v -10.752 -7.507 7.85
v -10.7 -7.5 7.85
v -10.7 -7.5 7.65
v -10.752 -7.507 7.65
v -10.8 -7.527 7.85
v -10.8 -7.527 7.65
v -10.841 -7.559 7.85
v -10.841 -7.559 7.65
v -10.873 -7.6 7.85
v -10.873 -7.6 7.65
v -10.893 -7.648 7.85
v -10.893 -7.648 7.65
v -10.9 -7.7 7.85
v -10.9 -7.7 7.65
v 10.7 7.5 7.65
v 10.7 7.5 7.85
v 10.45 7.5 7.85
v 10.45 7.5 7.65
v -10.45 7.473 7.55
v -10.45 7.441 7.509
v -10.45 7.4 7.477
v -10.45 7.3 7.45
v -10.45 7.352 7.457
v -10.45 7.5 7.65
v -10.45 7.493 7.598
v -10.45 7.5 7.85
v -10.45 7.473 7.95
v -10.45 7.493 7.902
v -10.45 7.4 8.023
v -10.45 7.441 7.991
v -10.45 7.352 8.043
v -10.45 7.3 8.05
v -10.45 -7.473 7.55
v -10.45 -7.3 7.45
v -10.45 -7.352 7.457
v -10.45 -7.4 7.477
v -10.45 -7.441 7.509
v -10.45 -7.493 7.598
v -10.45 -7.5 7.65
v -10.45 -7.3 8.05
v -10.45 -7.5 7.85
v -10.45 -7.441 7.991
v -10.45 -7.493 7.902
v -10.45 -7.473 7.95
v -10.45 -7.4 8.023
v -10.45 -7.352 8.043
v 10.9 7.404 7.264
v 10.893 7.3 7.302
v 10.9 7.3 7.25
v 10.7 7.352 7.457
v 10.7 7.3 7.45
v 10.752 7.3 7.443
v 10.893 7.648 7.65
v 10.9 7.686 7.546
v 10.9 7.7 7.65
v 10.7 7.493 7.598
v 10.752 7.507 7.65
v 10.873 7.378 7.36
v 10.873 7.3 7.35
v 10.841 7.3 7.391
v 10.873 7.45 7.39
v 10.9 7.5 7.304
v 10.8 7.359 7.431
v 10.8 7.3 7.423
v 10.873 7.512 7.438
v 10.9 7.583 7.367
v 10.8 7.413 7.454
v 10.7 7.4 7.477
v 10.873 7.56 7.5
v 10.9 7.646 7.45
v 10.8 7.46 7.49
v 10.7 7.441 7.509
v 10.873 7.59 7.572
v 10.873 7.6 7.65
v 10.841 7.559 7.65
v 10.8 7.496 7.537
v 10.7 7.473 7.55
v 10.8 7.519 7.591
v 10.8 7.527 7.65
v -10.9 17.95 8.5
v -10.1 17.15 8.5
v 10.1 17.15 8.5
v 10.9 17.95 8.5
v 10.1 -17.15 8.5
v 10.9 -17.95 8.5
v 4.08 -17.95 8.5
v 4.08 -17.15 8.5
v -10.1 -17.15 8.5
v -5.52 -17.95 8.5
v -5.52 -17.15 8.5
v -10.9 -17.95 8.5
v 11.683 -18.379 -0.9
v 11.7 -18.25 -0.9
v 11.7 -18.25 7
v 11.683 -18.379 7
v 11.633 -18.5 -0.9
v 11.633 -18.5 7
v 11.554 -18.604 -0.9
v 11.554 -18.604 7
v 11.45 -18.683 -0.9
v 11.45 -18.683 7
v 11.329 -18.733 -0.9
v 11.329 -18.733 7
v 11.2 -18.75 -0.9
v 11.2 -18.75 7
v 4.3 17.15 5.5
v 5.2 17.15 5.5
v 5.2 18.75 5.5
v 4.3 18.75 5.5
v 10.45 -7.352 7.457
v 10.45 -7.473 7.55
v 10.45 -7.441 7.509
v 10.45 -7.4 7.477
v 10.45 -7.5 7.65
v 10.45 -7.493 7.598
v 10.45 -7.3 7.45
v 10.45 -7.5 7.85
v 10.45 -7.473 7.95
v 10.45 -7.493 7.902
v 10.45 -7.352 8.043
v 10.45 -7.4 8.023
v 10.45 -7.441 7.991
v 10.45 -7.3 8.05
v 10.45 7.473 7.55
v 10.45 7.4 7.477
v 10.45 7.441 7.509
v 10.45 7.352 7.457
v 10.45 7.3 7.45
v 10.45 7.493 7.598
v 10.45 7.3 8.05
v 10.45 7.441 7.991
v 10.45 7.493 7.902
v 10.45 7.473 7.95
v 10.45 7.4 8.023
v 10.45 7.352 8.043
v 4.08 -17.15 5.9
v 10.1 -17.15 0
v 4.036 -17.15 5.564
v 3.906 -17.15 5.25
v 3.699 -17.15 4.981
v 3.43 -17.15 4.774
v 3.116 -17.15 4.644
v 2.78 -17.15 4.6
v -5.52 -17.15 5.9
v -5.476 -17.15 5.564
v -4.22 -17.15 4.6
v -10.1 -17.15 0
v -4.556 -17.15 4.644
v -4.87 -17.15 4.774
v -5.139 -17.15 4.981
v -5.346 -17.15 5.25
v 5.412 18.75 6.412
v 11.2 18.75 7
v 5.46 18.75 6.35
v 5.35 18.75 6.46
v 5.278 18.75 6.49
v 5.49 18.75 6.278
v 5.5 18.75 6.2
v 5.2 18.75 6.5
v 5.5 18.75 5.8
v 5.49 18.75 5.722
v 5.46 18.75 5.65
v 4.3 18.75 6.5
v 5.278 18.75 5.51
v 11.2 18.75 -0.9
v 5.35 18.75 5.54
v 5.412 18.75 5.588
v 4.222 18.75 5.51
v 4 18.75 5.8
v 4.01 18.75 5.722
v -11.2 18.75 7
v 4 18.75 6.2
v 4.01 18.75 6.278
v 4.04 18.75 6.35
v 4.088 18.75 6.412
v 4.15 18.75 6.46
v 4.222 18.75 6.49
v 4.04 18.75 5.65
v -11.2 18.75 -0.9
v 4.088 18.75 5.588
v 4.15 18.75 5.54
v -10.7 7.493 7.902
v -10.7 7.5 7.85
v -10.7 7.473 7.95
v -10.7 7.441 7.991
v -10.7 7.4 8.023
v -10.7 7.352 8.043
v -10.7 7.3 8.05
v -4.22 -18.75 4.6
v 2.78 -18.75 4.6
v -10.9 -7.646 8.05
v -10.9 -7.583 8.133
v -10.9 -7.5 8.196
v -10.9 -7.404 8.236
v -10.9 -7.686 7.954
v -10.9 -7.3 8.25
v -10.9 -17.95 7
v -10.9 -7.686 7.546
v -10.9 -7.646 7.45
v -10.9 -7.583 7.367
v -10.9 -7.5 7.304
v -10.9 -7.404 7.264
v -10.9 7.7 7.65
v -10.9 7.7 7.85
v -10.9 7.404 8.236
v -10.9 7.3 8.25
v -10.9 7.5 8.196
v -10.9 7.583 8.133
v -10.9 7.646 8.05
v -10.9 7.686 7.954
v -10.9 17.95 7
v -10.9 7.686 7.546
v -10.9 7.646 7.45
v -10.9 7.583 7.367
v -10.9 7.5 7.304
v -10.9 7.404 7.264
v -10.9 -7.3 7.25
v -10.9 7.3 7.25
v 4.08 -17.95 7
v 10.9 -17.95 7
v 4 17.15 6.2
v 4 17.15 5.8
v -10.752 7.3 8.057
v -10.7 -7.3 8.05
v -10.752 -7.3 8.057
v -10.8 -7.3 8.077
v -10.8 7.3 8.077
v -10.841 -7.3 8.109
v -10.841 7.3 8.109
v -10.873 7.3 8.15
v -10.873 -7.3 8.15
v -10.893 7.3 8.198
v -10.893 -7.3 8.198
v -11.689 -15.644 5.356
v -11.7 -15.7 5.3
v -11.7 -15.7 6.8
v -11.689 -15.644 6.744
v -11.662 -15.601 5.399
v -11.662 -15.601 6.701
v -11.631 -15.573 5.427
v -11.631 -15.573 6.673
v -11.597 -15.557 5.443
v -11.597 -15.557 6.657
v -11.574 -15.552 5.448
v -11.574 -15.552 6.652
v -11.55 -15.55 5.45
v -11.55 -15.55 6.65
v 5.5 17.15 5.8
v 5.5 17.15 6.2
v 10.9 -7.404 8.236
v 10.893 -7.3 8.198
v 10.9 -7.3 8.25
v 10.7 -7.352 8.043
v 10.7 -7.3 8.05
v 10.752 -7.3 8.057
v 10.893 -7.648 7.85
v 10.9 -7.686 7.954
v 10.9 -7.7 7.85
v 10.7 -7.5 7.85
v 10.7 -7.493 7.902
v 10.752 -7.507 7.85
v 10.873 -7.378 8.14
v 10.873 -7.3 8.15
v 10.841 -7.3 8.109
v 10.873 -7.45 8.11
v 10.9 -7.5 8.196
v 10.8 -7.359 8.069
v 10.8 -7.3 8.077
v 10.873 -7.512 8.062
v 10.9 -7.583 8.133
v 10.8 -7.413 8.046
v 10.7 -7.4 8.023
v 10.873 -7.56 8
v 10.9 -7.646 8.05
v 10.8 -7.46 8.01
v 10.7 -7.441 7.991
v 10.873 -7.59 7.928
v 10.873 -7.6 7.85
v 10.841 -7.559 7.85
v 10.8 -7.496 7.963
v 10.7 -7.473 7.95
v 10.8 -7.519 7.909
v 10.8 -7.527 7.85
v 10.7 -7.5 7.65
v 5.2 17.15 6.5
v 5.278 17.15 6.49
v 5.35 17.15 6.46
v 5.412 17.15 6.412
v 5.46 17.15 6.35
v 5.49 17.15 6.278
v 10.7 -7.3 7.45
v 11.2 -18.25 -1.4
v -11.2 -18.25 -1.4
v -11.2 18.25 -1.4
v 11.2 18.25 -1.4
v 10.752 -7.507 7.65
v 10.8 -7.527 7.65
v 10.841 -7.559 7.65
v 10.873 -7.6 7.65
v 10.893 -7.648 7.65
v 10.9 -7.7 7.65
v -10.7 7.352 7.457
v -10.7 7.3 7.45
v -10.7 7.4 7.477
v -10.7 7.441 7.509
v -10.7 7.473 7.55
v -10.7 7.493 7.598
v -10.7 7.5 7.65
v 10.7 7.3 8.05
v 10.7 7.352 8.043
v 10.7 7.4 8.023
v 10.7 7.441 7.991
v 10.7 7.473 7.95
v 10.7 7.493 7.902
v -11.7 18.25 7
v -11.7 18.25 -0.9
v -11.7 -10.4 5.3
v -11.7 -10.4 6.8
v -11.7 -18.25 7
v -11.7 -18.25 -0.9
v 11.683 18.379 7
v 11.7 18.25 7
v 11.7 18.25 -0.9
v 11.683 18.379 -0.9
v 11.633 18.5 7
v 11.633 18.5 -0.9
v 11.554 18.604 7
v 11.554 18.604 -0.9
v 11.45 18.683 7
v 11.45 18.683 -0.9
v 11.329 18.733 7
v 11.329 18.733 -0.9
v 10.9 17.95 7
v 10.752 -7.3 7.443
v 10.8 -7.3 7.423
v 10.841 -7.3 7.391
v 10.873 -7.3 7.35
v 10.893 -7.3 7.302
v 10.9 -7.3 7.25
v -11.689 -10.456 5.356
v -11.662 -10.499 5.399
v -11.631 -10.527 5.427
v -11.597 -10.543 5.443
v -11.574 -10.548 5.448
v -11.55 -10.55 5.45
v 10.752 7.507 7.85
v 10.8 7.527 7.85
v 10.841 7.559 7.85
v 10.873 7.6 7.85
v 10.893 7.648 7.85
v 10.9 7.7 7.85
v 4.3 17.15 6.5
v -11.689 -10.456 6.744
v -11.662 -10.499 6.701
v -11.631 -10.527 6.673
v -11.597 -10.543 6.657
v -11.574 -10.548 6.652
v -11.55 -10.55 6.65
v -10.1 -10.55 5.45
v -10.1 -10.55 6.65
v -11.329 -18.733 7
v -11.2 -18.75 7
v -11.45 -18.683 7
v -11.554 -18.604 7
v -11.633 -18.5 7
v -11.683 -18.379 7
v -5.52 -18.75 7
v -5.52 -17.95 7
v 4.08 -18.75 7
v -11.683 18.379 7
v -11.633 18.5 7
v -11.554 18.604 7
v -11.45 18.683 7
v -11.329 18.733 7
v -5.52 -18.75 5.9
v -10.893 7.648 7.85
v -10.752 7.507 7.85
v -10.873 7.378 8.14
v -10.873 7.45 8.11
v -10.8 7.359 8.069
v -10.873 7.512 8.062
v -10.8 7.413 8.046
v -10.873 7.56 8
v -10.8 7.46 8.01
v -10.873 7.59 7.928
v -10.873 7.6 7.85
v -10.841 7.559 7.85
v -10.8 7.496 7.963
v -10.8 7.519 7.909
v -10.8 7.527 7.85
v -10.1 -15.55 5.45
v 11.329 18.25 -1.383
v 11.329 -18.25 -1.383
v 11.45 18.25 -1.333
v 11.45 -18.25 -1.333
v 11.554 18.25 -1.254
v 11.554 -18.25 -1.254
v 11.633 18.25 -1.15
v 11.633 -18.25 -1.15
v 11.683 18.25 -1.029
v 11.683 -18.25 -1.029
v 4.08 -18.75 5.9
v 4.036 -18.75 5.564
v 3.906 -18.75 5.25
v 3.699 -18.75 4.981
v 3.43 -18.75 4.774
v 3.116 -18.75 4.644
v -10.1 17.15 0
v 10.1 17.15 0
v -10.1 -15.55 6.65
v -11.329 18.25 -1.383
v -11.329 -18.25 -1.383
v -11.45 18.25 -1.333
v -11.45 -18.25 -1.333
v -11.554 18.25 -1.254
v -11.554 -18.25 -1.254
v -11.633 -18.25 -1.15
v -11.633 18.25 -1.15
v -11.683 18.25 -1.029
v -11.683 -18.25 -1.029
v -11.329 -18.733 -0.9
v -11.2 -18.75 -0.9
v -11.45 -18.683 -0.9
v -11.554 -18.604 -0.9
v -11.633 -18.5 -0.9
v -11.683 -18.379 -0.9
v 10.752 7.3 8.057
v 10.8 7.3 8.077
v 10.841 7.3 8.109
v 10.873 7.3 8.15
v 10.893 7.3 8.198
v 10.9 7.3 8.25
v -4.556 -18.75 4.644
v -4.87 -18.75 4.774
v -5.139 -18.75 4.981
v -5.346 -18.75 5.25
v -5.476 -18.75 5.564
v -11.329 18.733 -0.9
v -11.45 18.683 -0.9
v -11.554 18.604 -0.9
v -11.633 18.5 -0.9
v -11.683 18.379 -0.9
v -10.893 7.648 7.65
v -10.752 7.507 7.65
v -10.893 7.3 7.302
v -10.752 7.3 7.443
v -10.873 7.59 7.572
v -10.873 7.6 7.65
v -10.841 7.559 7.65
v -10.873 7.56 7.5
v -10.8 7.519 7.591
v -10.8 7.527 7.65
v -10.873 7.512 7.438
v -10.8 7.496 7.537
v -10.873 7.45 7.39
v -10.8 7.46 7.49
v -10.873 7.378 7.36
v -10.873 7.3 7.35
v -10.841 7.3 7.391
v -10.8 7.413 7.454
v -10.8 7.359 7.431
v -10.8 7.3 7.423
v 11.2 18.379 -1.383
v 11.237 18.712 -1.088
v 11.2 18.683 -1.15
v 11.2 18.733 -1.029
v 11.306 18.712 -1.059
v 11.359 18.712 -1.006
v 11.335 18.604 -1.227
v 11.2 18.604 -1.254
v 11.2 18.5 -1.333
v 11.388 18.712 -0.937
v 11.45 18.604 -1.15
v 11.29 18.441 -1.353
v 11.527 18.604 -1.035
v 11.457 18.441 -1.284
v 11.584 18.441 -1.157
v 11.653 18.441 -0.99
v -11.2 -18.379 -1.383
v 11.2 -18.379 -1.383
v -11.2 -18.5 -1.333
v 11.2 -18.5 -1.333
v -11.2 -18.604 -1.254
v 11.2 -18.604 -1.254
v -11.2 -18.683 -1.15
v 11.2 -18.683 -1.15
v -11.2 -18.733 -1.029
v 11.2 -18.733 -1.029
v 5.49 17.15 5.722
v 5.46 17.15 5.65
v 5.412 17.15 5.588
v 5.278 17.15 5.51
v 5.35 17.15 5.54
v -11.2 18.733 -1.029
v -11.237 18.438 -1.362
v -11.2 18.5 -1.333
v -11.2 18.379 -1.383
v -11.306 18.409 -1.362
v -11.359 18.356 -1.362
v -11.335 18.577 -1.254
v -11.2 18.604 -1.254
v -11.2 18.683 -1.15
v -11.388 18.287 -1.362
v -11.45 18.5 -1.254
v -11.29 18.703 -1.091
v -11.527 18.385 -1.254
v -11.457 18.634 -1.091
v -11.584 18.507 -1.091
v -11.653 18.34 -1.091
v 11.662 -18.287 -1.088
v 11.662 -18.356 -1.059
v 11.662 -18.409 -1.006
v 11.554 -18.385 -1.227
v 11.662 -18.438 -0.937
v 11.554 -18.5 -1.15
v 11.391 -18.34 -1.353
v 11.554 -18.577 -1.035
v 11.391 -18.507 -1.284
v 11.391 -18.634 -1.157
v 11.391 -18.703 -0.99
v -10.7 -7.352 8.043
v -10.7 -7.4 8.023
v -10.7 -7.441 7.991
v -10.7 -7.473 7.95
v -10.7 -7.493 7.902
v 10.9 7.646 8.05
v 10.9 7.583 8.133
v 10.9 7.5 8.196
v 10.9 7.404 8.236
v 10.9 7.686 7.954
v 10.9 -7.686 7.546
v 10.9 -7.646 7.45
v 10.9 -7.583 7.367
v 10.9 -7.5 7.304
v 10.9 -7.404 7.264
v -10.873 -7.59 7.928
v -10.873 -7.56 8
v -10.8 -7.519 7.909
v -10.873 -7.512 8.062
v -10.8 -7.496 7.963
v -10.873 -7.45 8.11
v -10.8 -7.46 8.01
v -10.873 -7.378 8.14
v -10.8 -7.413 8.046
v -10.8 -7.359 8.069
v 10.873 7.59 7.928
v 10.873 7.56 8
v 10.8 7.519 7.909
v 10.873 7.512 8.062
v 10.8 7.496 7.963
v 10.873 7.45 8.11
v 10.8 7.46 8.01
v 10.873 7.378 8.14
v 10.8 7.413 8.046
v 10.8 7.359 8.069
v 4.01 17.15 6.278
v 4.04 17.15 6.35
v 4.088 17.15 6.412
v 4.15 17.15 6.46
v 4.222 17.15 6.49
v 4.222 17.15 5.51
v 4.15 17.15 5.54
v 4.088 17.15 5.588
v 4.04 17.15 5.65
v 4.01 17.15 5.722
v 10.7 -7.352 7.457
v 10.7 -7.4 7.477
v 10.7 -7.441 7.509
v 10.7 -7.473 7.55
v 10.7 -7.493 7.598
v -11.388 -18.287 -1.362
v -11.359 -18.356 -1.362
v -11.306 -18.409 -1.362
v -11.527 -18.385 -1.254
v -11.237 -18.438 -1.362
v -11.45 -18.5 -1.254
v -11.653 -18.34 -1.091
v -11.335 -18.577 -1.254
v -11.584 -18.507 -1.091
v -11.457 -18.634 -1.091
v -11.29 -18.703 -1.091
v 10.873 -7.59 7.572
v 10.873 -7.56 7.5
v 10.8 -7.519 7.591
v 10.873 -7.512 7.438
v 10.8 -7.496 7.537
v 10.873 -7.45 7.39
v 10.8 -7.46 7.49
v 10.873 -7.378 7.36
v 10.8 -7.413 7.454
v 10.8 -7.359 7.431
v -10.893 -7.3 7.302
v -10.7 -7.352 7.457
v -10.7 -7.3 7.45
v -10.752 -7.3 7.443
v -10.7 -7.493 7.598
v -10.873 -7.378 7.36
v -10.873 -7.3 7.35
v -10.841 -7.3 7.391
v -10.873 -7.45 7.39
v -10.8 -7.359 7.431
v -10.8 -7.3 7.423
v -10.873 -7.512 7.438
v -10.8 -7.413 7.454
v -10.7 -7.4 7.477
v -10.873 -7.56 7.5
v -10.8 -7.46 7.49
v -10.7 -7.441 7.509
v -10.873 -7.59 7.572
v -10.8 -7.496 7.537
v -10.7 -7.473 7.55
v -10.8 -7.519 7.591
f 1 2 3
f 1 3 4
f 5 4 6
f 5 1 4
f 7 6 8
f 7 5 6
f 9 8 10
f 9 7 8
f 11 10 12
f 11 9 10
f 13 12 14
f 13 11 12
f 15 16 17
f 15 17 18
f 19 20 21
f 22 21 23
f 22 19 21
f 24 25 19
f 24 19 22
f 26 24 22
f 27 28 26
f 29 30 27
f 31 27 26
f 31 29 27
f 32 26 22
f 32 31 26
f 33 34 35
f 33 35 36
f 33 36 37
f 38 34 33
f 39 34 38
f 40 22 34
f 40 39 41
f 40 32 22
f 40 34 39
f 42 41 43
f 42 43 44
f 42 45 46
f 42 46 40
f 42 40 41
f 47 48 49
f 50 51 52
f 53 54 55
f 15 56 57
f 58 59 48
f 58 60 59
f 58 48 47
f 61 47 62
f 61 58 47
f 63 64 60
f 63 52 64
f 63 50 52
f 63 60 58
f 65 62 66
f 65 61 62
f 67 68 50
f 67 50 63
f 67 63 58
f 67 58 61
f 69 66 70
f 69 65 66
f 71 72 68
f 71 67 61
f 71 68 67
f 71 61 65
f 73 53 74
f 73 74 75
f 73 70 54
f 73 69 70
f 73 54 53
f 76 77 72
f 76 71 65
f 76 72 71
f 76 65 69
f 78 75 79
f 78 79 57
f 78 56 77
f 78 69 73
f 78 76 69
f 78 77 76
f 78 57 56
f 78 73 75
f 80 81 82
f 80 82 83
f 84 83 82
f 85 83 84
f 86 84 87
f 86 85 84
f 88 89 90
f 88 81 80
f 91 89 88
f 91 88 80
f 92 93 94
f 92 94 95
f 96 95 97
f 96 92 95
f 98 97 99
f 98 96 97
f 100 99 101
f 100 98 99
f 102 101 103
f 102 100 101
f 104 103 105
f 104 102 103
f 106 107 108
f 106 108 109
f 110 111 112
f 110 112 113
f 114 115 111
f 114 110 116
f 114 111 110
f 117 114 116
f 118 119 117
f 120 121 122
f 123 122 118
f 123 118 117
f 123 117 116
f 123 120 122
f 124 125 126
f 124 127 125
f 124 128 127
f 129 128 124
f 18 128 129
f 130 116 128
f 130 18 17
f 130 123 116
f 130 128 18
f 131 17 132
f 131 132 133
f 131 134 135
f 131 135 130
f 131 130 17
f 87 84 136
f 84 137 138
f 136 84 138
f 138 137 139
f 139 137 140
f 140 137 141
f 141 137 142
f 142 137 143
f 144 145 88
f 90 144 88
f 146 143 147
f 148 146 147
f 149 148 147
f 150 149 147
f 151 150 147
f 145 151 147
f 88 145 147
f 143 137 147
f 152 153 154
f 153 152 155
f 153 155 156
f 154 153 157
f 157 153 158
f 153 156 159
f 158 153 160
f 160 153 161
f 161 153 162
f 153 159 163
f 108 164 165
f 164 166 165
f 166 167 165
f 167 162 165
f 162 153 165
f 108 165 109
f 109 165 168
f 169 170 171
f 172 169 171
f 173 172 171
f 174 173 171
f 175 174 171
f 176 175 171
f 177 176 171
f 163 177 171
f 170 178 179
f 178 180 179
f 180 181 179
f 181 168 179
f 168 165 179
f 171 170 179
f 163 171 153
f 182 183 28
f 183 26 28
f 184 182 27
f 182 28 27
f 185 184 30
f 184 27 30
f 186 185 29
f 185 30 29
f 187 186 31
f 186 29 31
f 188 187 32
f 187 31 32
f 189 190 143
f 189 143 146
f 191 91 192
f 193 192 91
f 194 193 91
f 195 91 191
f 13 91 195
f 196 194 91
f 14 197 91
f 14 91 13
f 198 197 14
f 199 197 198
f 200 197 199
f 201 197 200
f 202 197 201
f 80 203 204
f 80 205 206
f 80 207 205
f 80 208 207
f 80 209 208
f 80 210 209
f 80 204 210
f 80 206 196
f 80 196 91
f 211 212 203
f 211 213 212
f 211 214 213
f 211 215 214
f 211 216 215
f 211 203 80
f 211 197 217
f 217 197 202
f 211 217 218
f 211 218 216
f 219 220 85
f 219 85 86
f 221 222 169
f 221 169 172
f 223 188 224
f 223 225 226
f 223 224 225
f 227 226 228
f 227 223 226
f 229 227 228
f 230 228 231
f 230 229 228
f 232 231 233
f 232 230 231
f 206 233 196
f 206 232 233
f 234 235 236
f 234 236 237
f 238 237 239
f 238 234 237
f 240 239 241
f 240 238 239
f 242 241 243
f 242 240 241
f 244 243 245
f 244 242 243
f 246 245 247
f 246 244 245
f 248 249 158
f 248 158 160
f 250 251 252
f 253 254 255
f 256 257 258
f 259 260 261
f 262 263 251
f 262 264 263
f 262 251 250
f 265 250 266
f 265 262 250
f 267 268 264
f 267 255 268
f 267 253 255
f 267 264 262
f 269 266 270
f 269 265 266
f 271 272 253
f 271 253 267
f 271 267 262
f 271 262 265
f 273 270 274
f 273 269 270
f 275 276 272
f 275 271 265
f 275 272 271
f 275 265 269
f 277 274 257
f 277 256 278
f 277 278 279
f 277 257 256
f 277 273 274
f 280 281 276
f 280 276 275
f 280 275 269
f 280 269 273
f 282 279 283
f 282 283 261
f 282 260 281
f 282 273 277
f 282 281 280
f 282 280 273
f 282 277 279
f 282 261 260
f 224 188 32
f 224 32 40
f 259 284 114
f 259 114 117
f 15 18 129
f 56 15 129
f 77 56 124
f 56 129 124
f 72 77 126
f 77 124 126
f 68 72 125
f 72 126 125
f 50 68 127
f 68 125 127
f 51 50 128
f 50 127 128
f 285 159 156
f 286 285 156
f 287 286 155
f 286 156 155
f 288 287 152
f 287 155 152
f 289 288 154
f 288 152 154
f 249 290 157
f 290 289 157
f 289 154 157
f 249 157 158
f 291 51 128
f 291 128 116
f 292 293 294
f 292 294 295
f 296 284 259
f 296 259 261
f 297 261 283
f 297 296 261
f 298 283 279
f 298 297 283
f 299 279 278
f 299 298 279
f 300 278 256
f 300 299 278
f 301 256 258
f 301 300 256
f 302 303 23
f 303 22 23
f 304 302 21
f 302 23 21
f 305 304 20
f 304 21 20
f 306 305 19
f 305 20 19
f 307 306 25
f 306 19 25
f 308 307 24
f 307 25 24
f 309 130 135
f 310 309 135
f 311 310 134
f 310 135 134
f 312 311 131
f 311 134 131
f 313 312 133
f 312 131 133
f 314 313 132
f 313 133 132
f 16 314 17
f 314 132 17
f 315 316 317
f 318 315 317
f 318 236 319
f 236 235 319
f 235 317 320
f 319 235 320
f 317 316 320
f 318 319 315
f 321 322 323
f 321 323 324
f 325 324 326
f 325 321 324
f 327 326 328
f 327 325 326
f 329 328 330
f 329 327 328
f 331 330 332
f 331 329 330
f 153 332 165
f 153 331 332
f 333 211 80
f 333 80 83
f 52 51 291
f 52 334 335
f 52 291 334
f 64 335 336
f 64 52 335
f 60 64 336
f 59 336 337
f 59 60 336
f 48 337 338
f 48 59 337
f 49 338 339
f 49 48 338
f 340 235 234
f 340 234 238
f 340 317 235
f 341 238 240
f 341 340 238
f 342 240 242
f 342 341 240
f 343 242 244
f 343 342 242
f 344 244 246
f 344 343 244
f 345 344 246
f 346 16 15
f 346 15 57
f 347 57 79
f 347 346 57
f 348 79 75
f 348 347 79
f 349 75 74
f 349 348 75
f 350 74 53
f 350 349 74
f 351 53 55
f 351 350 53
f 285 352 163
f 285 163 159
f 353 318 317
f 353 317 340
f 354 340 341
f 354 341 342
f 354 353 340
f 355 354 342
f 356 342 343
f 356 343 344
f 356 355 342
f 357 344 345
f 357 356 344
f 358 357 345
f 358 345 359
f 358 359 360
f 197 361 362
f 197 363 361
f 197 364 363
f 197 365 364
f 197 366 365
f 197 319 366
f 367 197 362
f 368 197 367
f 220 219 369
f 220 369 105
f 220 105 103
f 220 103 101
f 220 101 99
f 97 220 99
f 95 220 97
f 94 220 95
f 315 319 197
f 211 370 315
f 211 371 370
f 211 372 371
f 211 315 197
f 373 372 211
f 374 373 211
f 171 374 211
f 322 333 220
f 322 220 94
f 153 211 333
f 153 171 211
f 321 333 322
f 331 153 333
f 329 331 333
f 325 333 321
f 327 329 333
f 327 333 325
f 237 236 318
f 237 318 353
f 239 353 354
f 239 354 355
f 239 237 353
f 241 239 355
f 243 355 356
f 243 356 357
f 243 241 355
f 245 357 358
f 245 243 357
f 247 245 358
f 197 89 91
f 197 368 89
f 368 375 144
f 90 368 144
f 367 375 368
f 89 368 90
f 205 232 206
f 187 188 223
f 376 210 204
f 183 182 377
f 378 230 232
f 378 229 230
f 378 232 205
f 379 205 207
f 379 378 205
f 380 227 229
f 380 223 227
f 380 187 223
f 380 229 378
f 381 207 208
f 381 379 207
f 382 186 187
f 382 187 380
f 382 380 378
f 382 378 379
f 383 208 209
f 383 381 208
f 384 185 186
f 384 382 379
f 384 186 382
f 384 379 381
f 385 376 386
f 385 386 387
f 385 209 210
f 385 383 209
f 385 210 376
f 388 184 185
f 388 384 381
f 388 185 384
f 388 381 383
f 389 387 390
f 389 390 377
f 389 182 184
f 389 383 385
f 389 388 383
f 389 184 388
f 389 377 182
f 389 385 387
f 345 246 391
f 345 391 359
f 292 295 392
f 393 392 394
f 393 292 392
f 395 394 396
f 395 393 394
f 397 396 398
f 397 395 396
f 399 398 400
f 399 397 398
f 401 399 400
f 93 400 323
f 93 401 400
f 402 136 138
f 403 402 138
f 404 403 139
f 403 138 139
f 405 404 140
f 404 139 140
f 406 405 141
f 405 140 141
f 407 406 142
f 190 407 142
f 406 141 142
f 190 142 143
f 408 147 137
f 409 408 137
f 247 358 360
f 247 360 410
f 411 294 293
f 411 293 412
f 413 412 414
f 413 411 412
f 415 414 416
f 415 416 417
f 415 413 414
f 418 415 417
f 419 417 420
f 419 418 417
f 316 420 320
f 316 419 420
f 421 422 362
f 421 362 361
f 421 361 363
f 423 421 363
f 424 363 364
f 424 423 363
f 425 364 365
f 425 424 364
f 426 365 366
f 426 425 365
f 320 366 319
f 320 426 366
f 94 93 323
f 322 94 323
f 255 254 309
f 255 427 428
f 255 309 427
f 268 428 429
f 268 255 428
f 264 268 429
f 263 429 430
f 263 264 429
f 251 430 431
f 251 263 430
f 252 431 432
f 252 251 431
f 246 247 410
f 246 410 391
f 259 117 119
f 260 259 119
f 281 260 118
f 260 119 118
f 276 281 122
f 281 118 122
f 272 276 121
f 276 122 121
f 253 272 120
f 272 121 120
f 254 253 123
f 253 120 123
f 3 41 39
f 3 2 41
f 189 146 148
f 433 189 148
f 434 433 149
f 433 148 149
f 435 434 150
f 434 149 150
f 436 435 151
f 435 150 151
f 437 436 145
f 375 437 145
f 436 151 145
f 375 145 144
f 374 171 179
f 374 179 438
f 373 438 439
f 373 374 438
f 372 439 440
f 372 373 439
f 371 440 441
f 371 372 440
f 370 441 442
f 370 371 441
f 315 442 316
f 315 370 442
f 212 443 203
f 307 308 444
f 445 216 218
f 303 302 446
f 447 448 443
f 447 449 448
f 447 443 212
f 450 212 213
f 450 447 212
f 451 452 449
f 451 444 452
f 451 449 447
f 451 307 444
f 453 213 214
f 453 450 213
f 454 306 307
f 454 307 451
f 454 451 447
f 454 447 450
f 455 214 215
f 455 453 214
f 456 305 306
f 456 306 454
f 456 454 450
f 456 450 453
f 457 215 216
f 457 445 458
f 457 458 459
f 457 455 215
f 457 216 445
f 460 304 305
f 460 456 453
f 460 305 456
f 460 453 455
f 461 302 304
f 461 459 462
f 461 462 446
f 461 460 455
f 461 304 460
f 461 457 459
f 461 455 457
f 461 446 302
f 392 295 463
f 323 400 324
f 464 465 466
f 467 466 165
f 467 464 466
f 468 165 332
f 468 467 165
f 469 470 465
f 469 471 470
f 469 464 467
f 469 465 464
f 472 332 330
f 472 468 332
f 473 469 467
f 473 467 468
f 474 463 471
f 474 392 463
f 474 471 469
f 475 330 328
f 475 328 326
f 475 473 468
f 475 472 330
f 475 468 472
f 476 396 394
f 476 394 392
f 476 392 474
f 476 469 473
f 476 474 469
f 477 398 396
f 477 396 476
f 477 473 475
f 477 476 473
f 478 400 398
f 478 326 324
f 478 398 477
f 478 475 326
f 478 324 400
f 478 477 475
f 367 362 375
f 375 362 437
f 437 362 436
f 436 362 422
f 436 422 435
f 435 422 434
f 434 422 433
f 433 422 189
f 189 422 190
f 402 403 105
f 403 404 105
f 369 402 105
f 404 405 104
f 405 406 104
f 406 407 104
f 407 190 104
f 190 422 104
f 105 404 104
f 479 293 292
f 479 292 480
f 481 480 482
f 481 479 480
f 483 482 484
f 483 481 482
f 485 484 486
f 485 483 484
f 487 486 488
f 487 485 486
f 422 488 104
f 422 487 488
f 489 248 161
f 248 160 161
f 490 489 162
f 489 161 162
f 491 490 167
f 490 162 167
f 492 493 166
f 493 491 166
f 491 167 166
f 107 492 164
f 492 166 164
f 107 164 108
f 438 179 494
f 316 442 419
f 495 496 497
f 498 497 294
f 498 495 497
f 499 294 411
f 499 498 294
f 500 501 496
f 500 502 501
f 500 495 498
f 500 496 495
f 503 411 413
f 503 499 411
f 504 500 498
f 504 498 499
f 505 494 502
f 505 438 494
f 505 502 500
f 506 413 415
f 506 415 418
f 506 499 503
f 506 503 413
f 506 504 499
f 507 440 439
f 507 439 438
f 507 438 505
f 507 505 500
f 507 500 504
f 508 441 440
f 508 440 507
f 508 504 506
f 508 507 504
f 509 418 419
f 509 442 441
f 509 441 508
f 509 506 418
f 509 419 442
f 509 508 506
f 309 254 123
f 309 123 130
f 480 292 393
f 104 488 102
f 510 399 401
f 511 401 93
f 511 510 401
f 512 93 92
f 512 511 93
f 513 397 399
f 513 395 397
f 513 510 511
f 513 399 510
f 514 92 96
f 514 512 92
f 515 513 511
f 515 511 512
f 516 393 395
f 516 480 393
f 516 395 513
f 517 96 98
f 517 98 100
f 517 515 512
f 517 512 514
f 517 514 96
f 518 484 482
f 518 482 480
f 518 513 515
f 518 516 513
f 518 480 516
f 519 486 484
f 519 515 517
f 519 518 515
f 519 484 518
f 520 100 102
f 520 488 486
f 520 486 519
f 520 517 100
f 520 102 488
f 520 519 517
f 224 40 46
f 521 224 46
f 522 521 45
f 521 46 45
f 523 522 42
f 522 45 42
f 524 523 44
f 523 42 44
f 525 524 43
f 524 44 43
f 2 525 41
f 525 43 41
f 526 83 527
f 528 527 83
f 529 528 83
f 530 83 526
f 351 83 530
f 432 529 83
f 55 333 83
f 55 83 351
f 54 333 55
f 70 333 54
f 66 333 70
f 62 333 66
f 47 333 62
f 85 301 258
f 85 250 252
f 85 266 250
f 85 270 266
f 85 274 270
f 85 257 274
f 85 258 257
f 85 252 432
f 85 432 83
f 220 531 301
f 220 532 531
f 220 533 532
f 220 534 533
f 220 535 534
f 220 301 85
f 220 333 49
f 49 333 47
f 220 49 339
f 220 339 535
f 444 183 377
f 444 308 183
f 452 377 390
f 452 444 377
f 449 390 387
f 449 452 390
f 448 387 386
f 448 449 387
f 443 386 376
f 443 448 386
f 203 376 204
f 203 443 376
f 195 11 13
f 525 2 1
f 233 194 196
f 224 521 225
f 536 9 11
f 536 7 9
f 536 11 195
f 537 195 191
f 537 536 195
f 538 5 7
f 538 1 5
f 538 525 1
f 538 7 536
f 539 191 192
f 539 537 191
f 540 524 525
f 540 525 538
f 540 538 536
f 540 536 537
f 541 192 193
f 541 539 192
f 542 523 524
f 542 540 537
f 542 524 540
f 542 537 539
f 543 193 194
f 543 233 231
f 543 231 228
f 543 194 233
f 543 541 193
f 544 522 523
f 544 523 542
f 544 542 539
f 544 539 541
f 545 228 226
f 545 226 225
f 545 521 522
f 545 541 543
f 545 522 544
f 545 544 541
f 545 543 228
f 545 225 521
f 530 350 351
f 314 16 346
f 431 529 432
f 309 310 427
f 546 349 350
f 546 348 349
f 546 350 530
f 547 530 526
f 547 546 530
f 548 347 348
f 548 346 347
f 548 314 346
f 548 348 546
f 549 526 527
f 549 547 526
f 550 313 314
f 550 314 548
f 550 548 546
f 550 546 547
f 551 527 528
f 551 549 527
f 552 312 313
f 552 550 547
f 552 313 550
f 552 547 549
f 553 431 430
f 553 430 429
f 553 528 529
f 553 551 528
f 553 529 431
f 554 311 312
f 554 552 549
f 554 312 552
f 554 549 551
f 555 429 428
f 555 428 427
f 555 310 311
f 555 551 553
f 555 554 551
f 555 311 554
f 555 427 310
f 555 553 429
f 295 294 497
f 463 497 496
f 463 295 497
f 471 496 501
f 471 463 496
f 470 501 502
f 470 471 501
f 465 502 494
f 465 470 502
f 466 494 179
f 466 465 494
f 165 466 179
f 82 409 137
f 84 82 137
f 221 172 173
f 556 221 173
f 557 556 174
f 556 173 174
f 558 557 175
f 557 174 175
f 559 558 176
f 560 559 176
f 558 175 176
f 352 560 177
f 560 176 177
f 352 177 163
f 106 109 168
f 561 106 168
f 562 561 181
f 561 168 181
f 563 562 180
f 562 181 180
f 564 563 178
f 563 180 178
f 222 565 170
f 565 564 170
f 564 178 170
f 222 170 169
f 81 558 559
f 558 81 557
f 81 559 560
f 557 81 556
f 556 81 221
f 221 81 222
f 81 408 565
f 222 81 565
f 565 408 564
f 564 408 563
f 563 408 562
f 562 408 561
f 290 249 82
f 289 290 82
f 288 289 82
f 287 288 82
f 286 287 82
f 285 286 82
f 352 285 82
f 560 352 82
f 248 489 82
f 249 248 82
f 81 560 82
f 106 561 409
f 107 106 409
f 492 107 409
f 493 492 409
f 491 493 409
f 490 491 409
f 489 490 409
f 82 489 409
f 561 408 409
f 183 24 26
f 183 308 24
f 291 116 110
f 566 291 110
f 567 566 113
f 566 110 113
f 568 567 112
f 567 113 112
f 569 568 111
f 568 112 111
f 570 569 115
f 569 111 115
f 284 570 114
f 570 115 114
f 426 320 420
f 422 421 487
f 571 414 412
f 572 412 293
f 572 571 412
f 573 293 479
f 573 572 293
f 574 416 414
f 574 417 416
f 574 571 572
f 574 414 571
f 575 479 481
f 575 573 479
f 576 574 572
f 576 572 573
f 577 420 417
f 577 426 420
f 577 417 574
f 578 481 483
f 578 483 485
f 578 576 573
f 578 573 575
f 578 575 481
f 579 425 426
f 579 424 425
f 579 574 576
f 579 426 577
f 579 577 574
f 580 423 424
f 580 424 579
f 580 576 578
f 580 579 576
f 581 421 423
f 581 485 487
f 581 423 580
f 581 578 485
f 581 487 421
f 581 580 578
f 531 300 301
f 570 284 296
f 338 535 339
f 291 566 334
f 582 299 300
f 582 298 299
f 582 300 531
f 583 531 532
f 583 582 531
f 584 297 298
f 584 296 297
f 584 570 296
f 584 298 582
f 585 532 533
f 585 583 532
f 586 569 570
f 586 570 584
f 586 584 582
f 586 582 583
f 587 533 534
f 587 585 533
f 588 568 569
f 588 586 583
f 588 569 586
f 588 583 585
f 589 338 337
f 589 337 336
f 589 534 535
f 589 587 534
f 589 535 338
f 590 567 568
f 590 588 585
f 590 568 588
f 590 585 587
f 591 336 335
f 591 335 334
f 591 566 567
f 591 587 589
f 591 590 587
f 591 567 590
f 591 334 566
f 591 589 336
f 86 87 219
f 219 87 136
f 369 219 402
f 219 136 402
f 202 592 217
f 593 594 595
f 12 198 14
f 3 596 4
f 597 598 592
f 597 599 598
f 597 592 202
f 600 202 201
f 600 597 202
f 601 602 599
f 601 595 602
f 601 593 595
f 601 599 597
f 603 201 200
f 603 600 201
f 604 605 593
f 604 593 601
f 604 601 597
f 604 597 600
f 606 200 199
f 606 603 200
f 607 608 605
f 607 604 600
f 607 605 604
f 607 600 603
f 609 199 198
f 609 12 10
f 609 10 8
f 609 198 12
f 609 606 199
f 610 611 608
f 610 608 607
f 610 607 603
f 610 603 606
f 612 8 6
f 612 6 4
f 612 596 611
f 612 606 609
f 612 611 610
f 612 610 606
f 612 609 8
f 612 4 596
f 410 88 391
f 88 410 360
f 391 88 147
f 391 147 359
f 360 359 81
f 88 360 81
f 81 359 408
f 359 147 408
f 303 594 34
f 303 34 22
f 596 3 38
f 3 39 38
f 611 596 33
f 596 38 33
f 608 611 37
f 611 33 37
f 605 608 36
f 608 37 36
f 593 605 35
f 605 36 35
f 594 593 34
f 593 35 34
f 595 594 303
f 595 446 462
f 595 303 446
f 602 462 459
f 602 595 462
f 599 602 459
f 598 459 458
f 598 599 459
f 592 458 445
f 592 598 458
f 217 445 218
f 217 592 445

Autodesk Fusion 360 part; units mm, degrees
sketch "Sketch1" plane through (0, 0, 0) normal (0, 0, 1) x (1, 0, 0)
  line L0 (10.1, -17.15) -> (-10.1, -17.15)
  line L1 (-10.1, -17.15) -> (-10.1, 17.15)
  line L2 (-10.1, 17.15) -> (10.1, 17.15)
  line L3 (10.1, 17.15) -> (10.1, -17.15)
  line L4 (10.1, -17.15) -> (-10.1, 17.15) construction
  line L5 (-10.1, -17.15) -> (10.1, 17.15) construction
  line L6 (11.7, 18.75) -> (-11.7, 18.75)
  line L7 (-11.7, 18.75) -> (-11.7, -18.75)
  line L8 (-11.7, -18.75) -> (11.7, -18.75)
  line L9 (11.7, -18.75) -> (11.7, 18.75)
  line L10 (11.7, 18.75) -> (-11.7, -18.75) construction
  line L11 (-11.7, 18.75) -> (11.7, -18.75) construction
  dimension "d1" = 20.2
  dimension "d2" = 34.3
  dimension "d4" = 1.6
  dimension "d5" = 1.6
extrude "Extrude1" add sketch "Sketch1" along normal blind 7
sketch "Sketch2" plane through (0, 0, 0) normal (0, 0, -1) x (1, 0, 0)
  line L0 (10.1, -17.15) -> (-10.1, -17.15)
  line L1 (-10.1, -17.15) -> (-10.1, 17.15)
  line L2 (-10.1, 17.15) -> (10.1, 17.15)
  line L3 (10.1, 17.15) -> (10.1, -17.15)
  line L4 (11.7, -18.75) -> (11.7, 18.75)
  line L5 (11.7, 18.75) -> (-11.7, 18.75)
  line L6 (-11.7, 18.75) -> (-11.7, -18.75)
  line L7 (-11.7, -18.75) -> (11.7, -18.75)
  line L8 (-11.7, 18.75) -> (11.7, 18.75)
  line L9 (11.7, 18.75) -> (11.7, -18.75)
  line L10 (11.7, -18.75) -> (-11.7, -18.75)
  line L11 (-11.7, -18.75) -> (-11.7, 18.75)
extrude "Extrude2" add sketch "Sketch2" along normal blind 1.4 contours L0 L1 L2 L3 | L4 L5 L6 L7 L8 L9 L10 L11
sketch "Sketch3" plane through (0, -18.75, 0) normal (0, -1, 0) x (1, 0, 0)
  line L0 (11.7, -1.4) -> (11.7, 7)
  line L1 (11.7, 7) -> (-11.7, 7)
  line L2 (-11.7, 7) -> (-11.7, -1.4)
  line L3 (-11.7, -1.4) -> (11.7, -1.4)
  line L4 (-5.52, 7) -> (4.08, 7)
  line L5 (4.08, 7) -> (4.08, 4.6)
  line L6 (4.08, 4.6) -> (-5.52, 4.6)
  line L7 (-5.52, 4.6) -> (-5.52, 7)
  dimension "d10" = 6
  dimension "d11" = 6.18
  dimension "d14" = 9.6
extrude "Extrude3" cut sketch "Sketch3" against normal up to surface (1.6 mm away) contours L1 L4 L5 L6 L7
fillet "Fillet1" radius 1.3 2 edges at (-5.52, -17.95, 4.6) (4.08, -17.95, 4.6)
sketch "Sketch4" plane through (-11.7, 0, 0) normal (-1, 0, 0) x (0, -1, 0)
  line L0 (18.75, -1.4) -> (18.75, 7)
  line L1 (18.75, 7) -> (-18.75, 7)
  line L2 (-18.75, 7) -> (-18.75, -1.4)
  line L3 (-18.75, -1.4) -> (18.75, -1.4)
  line L4 (10.55, 6.65) -> (15.55, 6.65)
  line L5 (15.55, 6.65) -> (15.55, 5.45)
  line L6 (15.55, 5.45) -> (10.55, 5.45)
  line L7 (10.55, 5.45) -> (10.55, 6.65)
  dimension "d17" = 3.2
  dimension "d18" = 5
  dimension "d19" = 1.2
  dimension "d22" = 0.35
extrude "Extrude4" cut sketch "Sketch4" against normal up to surface (1.6 mm away) contours L4 L5 L6 L7
fillet "Fillet2" radius 0.15 4 edges at (-11.7, -13.05, 5.45) (-11.7, -10.55, 6.05) (-11.7, -13.05, 6.65) (-11.7, -15.55, 6.05)
sketch "Sketch5" plane through (0, 0, 7) normal (0, 0, 1) x (-1, 0, 0)
  line L0 (-4.08, 17.15) -> (-4.08, 18.75)
  line L1 (-4.08, 18.75) -> (-11.7, 18.75)
  line L2 (-11.7, 18.75) -> (-11.7, -18.75)
  line L3 (-11.7, -18.75) -> (11.7, -18.75)
  line L4 (11.7, -18.75) -> (11.7, 18.75)
  line L5 (11.7, 18.75) -> (5.52, 18.75)
  line L6 (5.52, 18.75) -> (5.52, 17.15)
  line L7 (5.52, 17.15) -> (10.1, 17.15)
  line L8 (10.1, 17.15) -> (10.1, -17.15)
  line L9 (10.1, -17.15) -> (-10.1, -17.15)
  line L10 (-10.1, -17.15) -> (-10.1, 17.15)
  line L11 (-10.1, 17.15) -> (-4.08, 17.15)
  line L12 (10.9, -17.95) -> (-10.9, -17.95)
  line L13 (-10.9, -17.95) -> (-10.9, 17.95)
  line L14 (-10.9, 17.95) -> (10.9, 17.95)
  line L15 (10.9, 17.95) -> (10.9, -17.95)
  dimension "d26" = 0.8
  dimension "d27" = 0.8
  dimension "d28" = 0.8
  dimension "d29" = 0.8
extrude "Extrude5" add sketch "Sketch5" along normal blind 1.5 contours L0 L6 L7 L8 L9 L10 L11 L12 L13 L14 L15
sketch "Sketch7" plane through (10.9, 0, 0) normal (1, 0, 0) x (0, 1, 0)
  line L0 (-17.95, 7) -> (17.95, 7)
  line L1 (17.95, 7) -> (17.95, 8.5)
  line L2 (17.95, 8.5) -> (-17.95, 8.5)
  line L3 (-17.95, 8.5) -> (-17.95, 7)
  line L4 (-17.95, 8.5) -> (17.95, 7) construction
  line L5 (17.95, 8.5) -> (-17.95, 7) construction
  line L6 (0, 7.75) -> (-14.5, 7.75) construction
  line L7 (7.5, 7.45) -> (-7.5, 7.45)
  line L8 (-7.5, 7.45) -> (-7.5, 8.05)
  line L9 (-7.5, 8.05) -> (7.5, 8.05)
  line L10 (7.5, 8.05) -> (7.5, 7.45)
  line L11 (7.5, 7.45) -> (-7.5, 8.05) construction
  line L12 (-7.5, 7.45) -> (7.5, 8.05) construction
  point P0 (0, 7.75)
  dimension "d32" = 15
  dimension "d33" = 0.6
ref_plane "WorkPlane1" through (0, 0, 7.75) normal (1, 0, 0) x (0, 1, 0)
extrude "Extrude6" cut sketch "Sketch7" against normal blind 0.45 contours L7 L8 L9 L10
fillet "Fillet5" radius 0.2 4 edges at (10.675, -7.5, 7.45) (10.675, -7.5, 8.05) (10.675, 7.5, 7.45) (10.675, 7.5, 8.05)
fillet "Fillet6" radius 0.2 8 edges at (10.9, -7.4414, 7.5086) (10.9, 0, 7.45) (10.9, 7.4414, 7.5086) (10.9, 7.5, 7.75) (10.9, 7.4414, 7.9914) (10.9, 0, 8.05) (10.9, -7.4414, 7.9914) (10.9, -7.5, 7.75)
mirror "Mirror2" about plane through (0, 0, 7.75) normal (1, 0, 0) of "Extrude6"
fillet "Fillet7" radius 0.2 4 edges at (-10.675, 7.5, 7.45) (-10.675, 7.5, 8.05) (-10.675, -7.5, 7.45) (-10.675, -7.5, 8.05)
fillet "Fillet8" radius 0.2 8 edges at (-10.9, -7.4414, 7.9914) (-10.9, -7.5, 7.75) (-10.9, -7.4414, 7.5086) (-10.9, 0, 7.45) (-10.9, 7.4414, 7.5086) (-10.9, 7.5, 7.75) (-10.9, 7.4414, 7.9914) (-10.9, 0, 8.05)
fillet "Fillet9" radius 0.5 8 edges at (-11.7, 18.75, 2.8) (-11.7, -18.75, 2.8) (-11.7, 0, -1.4) (0, -18.75, -1.4) (11.7, -18.75, 2.8) (11.7, 0, -1.4) (11.7, 18.75, 2.8) (0, 18.75, -1.4)
sketch "Sketch8" plane through (0, 17.15, 0) normal (0, -1, 0) x (1, 0, 0)
  line L0 (-10.1, 0) -> (10.1, 0)
  line L1 (10.1, 0) -> (10.1, 8.5)
  line L2 (10.1, 8.5) -> (-10.1, 8.5)
  line L3 (-10.1, 8.5) -> (-10.1, 0)
  line L4 (4, 6.5) -> (5.5, 6.5)
  line L5 (5.5, 6.5) -> (5.5, 5.5)
  line L6 (5.5, 5.5) -> (4, 5.5)
  line L7 (4, 5.5) -> (4, 6.5)
  dimension "d55" = 4.6
  dimension "d56" = 1
  dimension "d57" = 1.5
  dimension "d58" = 2
extrude "Extrude7" cut sketch "Sketch8" against normal up to surface (1.6 mm away) contours L4 L5 L6 L7
fillet "Fillet10" radius 0.3 4 edges at (5.5, 17.95, 5.5) (5.5, 17.95, 6.5) (4, 17.95, 6.5) (4, 17.95, 5.5)
equation "case_thickness = 1.6 mm"
equation "d4 = case_thickness"
equation "d5 = case_thickness"
equation "d8 = case_thickness - 0.2 mm"
equation "d11 = 4.58 mm + case_thickness"
equation "lock_rim = 0.8 mm"
equation "d26 = lock_rim"
equation "d27 = lock_rim"
equation "d28 = lock_rim"
equation "d29 = lock_rim"
equation "d43 = clip_roundness"
equation "d45 = clip_roundness"
equation "clip_roundness = 0.2 mm"
equation "d50 = clip_roundness"
equation "d52 = clip_roundness"
